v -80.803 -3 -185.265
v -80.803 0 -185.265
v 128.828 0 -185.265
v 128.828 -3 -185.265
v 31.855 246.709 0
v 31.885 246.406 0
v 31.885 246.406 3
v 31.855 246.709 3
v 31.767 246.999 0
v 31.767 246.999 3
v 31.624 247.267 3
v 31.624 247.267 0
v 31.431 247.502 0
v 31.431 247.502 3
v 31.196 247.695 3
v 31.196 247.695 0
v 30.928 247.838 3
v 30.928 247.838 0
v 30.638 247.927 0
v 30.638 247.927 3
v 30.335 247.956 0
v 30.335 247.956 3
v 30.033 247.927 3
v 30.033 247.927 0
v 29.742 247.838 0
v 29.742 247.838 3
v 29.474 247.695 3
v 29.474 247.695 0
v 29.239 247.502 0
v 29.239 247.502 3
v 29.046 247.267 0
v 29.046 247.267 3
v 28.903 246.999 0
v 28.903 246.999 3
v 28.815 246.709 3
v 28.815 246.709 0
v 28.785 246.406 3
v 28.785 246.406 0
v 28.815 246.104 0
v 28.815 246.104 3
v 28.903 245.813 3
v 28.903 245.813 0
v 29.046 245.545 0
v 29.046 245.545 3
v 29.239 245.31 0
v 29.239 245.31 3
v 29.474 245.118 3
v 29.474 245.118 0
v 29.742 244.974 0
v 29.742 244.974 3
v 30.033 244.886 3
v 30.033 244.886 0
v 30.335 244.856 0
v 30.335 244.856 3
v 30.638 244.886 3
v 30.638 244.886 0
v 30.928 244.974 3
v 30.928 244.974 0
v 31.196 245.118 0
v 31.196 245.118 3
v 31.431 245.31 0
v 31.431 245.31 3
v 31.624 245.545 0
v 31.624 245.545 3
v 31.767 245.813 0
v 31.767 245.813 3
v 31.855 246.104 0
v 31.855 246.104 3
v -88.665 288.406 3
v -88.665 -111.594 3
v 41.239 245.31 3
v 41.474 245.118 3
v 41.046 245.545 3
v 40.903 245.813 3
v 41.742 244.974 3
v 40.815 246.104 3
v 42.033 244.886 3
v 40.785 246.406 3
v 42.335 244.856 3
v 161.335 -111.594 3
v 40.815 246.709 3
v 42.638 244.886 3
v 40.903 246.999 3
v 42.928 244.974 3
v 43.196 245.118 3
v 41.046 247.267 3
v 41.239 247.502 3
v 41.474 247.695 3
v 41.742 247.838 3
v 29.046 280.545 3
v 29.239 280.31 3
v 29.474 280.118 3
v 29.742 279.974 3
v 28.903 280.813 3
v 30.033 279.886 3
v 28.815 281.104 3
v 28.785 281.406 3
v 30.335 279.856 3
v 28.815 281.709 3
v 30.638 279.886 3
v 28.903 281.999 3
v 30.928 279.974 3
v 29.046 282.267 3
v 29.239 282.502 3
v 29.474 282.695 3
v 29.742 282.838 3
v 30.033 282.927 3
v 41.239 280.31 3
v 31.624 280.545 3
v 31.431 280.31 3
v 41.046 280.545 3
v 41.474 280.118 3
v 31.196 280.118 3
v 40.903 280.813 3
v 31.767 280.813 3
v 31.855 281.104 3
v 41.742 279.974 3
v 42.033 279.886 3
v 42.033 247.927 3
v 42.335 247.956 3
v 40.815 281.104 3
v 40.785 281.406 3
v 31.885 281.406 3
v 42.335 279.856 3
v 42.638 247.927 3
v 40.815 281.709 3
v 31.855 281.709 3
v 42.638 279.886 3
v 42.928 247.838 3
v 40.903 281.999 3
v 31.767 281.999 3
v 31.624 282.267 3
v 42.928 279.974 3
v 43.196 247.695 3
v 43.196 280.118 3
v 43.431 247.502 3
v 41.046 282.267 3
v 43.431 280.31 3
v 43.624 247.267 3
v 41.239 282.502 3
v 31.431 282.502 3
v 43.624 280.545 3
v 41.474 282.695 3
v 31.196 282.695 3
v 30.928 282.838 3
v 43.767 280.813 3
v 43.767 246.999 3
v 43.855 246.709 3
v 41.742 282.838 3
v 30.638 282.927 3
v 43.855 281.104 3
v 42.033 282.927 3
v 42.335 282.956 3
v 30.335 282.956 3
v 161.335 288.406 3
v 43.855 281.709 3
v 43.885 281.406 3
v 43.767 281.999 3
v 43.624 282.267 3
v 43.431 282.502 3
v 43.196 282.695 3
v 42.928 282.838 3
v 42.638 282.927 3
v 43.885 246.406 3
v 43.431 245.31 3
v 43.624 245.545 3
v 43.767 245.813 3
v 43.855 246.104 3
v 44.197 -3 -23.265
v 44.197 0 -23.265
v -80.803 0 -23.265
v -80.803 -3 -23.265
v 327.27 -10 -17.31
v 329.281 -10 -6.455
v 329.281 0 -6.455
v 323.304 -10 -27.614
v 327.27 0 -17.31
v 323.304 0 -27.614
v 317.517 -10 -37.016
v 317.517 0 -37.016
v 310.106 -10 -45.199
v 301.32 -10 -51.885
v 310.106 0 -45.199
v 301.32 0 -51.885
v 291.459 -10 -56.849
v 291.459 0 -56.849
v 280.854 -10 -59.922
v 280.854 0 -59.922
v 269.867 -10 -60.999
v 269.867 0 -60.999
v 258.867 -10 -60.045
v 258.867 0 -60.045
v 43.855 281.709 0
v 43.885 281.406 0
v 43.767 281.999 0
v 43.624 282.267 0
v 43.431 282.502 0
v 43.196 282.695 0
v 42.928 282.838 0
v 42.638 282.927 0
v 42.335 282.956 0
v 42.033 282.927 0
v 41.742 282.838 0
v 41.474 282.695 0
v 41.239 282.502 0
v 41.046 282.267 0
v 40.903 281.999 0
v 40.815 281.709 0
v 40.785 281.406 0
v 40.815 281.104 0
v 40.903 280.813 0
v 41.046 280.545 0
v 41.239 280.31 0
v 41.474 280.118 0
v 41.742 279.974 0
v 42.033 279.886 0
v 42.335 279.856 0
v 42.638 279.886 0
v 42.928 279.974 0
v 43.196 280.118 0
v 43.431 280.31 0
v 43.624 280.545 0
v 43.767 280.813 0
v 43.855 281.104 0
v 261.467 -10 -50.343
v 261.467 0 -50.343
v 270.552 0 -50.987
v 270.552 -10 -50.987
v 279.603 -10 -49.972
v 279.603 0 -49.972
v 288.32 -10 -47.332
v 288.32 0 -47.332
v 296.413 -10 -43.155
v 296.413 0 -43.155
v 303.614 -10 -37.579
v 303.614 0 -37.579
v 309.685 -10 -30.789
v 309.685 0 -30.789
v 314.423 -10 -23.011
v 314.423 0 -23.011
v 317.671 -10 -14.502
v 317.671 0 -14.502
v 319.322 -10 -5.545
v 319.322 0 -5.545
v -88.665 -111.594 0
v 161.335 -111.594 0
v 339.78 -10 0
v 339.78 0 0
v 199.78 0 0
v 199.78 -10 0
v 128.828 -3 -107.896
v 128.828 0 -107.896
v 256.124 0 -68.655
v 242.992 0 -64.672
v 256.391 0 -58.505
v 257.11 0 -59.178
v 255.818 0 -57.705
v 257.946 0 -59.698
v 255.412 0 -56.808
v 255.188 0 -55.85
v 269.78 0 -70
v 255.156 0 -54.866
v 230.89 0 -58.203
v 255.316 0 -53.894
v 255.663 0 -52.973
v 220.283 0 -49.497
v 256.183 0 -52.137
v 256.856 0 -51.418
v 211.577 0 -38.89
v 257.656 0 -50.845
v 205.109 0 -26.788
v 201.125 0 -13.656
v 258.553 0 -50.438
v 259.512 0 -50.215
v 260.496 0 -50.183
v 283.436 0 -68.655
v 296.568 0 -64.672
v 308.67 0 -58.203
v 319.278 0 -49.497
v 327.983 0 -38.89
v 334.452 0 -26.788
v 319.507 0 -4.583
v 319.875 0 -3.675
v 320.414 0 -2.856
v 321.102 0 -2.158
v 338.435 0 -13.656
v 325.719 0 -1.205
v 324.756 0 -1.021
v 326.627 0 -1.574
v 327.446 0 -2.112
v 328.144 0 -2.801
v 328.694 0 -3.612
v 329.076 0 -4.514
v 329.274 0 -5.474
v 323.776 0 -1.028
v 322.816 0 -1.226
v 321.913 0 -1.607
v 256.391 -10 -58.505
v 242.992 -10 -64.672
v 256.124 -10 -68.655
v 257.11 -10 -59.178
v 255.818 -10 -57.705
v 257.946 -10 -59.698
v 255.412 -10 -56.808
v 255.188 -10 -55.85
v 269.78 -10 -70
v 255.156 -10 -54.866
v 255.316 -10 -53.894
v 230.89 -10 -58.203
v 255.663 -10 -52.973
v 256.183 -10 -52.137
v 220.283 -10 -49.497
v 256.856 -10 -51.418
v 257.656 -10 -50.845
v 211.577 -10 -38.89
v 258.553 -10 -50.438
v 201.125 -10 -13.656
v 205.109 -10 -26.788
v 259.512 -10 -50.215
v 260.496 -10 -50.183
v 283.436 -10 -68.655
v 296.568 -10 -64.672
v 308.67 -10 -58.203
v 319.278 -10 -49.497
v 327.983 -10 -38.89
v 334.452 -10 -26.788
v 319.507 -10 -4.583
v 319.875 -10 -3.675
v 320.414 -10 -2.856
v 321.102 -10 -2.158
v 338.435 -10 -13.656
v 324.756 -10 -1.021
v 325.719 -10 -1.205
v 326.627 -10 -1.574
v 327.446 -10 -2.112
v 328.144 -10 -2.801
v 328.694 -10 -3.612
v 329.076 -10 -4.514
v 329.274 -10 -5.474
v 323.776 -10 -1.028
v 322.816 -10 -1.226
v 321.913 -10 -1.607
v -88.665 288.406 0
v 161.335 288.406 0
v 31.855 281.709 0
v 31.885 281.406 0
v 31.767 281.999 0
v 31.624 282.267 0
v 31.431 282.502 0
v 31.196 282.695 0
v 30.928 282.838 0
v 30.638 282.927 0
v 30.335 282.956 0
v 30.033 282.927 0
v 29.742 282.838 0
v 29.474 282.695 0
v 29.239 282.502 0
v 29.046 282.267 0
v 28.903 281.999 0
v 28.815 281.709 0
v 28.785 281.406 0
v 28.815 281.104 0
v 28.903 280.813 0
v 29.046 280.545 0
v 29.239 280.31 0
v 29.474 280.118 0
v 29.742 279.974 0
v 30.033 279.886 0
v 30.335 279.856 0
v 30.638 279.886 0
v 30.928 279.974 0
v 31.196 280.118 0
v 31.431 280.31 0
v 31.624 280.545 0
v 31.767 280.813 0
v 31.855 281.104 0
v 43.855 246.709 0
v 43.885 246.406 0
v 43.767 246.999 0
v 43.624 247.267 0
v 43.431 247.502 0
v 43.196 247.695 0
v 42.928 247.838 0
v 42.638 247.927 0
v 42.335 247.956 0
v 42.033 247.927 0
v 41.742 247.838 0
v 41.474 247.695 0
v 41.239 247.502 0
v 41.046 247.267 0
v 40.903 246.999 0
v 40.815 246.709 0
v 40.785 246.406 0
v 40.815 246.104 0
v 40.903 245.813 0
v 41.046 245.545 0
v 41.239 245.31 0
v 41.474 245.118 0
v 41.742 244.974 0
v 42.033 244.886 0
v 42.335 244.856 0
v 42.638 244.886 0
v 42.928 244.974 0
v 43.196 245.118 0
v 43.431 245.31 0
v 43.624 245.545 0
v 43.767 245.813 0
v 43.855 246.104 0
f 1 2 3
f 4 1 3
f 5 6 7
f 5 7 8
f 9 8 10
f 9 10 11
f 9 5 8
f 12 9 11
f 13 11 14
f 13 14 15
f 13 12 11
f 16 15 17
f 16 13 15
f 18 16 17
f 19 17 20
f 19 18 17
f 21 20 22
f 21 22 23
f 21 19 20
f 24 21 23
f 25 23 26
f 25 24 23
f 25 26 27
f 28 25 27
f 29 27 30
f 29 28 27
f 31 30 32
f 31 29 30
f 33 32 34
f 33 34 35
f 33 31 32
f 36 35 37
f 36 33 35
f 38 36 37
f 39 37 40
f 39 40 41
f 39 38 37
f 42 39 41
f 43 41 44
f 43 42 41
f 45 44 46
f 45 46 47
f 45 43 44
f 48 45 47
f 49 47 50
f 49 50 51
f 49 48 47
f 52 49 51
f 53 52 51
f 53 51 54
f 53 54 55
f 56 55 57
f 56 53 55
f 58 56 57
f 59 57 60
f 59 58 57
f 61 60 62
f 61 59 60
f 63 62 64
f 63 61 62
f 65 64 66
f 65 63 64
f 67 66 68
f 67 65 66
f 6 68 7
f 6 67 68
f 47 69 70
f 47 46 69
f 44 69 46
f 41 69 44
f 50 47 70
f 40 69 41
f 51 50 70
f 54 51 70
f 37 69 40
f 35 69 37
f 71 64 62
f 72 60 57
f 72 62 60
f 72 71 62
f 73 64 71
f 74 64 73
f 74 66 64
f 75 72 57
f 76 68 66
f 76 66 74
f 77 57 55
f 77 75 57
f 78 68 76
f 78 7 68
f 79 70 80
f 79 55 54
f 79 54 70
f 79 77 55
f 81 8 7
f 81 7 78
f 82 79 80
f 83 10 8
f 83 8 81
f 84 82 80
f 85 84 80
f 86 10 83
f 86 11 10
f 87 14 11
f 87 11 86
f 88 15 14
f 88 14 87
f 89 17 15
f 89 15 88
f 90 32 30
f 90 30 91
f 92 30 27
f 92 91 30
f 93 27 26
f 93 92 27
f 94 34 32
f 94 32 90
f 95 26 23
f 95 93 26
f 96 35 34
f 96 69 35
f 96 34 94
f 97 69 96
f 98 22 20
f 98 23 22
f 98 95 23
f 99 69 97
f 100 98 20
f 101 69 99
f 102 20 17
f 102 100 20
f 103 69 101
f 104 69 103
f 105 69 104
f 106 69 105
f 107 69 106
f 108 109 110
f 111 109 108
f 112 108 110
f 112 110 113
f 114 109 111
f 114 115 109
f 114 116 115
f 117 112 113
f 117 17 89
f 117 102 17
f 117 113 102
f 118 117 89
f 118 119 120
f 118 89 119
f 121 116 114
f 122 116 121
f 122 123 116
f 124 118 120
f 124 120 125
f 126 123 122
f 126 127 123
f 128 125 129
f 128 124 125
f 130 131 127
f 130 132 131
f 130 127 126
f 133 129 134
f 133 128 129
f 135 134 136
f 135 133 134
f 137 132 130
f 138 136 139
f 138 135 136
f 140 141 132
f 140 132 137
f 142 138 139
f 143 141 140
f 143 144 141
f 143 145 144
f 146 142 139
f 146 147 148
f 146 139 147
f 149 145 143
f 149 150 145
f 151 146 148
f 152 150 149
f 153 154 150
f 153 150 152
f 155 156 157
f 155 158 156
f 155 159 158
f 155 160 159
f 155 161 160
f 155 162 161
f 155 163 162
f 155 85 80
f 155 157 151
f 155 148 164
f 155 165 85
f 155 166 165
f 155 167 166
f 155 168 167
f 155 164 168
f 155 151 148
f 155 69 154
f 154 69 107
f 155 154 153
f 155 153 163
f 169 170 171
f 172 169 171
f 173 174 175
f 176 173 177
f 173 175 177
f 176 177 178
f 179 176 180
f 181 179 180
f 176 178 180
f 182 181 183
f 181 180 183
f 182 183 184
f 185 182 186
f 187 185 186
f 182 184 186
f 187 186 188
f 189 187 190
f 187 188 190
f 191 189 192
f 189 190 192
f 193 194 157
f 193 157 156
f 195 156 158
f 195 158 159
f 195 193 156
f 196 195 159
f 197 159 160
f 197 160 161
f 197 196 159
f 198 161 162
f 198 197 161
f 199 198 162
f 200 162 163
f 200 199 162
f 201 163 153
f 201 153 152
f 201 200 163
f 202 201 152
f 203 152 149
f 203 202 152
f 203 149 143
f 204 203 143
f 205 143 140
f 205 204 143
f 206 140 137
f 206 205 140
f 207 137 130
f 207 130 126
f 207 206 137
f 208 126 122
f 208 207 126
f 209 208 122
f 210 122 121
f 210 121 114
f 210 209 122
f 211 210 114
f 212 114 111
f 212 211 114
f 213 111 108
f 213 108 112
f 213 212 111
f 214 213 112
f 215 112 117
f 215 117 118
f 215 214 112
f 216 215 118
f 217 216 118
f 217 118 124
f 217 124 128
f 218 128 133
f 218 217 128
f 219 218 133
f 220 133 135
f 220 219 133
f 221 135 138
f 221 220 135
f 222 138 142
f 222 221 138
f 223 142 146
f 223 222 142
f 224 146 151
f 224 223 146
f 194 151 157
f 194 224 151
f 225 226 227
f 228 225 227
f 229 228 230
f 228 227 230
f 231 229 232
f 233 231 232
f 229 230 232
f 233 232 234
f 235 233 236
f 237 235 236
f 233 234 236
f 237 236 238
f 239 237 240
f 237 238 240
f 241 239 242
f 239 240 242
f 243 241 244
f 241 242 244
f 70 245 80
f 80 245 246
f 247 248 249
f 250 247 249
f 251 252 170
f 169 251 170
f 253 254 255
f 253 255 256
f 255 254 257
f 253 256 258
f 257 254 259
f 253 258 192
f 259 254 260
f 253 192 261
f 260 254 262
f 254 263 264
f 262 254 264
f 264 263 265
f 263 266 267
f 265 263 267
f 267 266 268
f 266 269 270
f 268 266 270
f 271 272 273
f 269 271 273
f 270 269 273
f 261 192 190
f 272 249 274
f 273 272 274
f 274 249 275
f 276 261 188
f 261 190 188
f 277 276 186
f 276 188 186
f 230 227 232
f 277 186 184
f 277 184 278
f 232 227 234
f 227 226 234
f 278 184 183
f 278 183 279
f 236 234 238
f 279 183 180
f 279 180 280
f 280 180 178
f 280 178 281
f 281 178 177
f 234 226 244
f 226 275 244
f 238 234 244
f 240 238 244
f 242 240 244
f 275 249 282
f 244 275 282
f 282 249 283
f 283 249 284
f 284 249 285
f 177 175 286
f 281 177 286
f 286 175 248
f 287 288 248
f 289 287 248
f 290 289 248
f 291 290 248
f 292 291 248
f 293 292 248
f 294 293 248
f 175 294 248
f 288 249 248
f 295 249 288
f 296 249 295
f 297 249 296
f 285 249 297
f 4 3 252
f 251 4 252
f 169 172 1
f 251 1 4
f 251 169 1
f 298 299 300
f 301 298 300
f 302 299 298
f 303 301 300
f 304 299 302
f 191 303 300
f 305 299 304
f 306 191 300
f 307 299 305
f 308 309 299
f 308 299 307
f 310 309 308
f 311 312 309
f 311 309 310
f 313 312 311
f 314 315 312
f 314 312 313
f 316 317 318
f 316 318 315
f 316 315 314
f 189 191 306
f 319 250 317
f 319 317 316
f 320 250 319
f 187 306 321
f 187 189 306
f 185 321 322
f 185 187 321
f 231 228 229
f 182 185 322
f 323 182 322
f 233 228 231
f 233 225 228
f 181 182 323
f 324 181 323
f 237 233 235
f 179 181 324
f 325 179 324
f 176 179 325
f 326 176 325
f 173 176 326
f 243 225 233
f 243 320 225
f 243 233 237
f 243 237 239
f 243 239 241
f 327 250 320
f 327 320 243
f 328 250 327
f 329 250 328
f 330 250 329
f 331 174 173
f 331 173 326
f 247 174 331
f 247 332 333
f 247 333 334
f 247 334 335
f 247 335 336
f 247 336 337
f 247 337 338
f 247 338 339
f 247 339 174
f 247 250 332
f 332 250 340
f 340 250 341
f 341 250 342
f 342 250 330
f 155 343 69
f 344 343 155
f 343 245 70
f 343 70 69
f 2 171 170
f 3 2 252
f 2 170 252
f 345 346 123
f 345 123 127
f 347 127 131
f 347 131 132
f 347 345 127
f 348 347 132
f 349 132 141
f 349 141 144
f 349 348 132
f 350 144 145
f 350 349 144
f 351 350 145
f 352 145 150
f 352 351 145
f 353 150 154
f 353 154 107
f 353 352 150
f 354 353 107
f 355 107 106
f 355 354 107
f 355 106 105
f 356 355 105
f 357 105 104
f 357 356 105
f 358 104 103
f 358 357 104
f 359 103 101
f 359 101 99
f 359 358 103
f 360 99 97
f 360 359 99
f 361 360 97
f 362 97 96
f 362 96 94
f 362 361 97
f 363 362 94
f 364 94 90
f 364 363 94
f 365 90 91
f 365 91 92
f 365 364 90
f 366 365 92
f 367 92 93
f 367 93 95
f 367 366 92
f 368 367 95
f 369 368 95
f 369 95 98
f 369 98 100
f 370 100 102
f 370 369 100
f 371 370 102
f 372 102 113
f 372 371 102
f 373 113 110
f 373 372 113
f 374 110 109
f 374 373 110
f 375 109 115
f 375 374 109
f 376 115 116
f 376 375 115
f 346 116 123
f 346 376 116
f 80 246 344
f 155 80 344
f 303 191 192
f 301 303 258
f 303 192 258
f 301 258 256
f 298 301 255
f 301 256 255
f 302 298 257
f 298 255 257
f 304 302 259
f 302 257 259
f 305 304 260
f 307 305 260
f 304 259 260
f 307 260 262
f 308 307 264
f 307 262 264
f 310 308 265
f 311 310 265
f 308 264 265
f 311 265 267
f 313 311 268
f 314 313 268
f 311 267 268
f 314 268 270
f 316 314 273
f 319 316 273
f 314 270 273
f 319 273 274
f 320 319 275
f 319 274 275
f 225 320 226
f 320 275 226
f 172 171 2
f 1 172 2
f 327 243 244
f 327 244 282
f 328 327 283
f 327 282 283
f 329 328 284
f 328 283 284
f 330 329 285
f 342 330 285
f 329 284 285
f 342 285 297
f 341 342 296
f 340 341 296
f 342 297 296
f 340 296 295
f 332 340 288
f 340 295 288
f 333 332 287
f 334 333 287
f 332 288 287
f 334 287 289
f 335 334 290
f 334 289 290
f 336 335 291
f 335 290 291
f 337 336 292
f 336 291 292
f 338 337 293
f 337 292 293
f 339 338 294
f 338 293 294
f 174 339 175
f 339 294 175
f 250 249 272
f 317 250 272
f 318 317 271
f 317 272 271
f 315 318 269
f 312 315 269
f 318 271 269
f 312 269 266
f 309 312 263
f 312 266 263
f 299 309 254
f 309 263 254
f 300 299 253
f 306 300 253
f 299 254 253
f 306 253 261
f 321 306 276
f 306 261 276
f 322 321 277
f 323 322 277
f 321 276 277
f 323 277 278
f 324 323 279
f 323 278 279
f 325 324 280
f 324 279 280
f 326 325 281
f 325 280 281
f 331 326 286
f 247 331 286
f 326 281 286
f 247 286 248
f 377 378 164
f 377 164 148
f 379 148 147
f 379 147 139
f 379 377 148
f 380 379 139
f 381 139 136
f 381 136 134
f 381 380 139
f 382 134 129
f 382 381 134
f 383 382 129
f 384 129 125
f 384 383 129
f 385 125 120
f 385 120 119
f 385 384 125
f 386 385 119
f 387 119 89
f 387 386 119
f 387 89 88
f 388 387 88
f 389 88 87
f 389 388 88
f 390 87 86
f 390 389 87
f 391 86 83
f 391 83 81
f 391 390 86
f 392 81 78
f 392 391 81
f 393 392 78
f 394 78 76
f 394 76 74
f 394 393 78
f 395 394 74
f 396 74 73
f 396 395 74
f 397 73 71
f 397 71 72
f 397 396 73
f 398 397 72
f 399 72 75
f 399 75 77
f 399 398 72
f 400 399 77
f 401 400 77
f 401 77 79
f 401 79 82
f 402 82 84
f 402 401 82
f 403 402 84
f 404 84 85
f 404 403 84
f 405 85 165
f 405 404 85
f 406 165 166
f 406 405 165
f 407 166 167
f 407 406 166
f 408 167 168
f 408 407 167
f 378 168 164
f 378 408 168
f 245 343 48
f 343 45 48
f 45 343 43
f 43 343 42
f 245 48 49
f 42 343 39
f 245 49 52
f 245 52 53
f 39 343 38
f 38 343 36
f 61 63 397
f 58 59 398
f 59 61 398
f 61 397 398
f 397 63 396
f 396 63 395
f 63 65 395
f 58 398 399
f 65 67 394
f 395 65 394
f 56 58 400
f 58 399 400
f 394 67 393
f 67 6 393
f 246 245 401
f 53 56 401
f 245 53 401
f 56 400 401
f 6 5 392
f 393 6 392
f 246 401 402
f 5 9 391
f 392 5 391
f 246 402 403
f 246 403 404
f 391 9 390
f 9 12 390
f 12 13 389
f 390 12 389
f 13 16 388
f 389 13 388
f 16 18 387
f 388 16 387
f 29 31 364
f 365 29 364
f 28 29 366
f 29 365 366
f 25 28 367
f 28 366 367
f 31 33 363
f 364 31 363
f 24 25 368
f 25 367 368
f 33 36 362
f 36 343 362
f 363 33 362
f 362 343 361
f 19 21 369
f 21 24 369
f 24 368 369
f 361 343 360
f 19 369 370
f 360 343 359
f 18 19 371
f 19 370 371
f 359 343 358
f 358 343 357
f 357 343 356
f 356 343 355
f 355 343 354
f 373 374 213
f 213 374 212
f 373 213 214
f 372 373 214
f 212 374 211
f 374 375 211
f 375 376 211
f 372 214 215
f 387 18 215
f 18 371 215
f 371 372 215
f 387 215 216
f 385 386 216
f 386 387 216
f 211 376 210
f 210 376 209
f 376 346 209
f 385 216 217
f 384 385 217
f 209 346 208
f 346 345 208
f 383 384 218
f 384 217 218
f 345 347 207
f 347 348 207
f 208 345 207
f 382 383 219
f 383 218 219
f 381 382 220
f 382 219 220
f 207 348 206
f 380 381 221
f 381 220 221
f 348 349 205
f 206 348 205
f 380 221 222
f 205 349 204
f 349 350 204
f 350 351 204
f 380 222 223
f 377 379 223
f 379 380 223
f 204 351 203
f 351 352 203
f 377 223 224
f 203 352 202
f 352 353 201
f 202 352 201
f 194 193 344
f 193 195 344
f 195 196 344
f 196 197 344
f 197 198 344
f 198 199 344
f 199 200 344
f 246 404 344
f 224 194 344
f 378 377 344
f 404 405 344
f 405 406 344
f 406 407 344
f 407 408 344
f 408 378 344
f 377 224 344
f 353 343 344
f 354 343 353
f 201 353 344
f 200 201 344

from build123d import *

# Parameters (mm, degrees)
F0_W     = 250
F0_H     = 400
F0_R     = 1.55
F1_DEPTH = 3
F3_DEPTH = 3
F5_DEPTH = 10


with BuildPart() as f1:
    # F0 (on Top) → F1 (new body)
    with BuildSketch(Plane.XY):
        with Locations((36.335228, 88.406332)):
            Rectangle(F0_W, F0_H)
        with Locations((30.335228, 246.406332)):
            Circle(F0_R, mode=Mode.SUBTRACT)
        with Locations((30.335228, 281.406332)):
            Circle(F0_R, mode=Mode.SUBTRACT)
        with Locations((42.335228, 246.406332)):
            Circle(F0_R, mode=Mode.SUBTRACT)
        with Locations((42.335228, 281.406332)):
            Circle(F0_R, mode=Mode.SUBTRACT)
    extrude(amount=F1_DEPTH)


with BuildPart() as f3:
    # F2 (on Front) → F3 (new body)
    with BuildSketch(Plane.XZ):
        Polygon((44.196748, -23.264695), (-80.803252, -23.264695), (-80.803252, -185.264695), (128.827692, -185.264695), (128.827692, -107.895639), align=None)
    extrude(amount=F3_DEPTH)


with BuildPart() as f5:
    # F4 (on Front) → F5 (new body)
    with BuildSketch(Plane.XZ):
        with BuildLine():
            Line((229.529343, 0), (199.780078, 0))
            ThreePointArc((199.780078, 0), (269.780078, -70), (339.780078, 0))
            Line((339.780078, 0), (309.529343, 0))
            Line((309.529343, 0), (229.529343, 0))
        make_face()
        with BuildLine():
            ThreePointArc((258.867424, -60.045097), (255.316202, -53.894199), (261.467099, -50.342977))
            ThreePointArc((261.467099, -50.342977), (300.140983, -40.531365), (319.322303, -5.545455))
            ThreePointArc((319.322303, -5.545455), (324.756144, -1.020704), (329.280895, -6.454545))
            ThreePointArc((329.280895, -6.454545), (305.867131, -48.744792), (258.867424, -60.045097))
        make_face(mode=Mode.SUBTRACT)
    extrude(amount=F5_DEPTH)


solid = Compound([f1.part, f3.part, f5.part])
